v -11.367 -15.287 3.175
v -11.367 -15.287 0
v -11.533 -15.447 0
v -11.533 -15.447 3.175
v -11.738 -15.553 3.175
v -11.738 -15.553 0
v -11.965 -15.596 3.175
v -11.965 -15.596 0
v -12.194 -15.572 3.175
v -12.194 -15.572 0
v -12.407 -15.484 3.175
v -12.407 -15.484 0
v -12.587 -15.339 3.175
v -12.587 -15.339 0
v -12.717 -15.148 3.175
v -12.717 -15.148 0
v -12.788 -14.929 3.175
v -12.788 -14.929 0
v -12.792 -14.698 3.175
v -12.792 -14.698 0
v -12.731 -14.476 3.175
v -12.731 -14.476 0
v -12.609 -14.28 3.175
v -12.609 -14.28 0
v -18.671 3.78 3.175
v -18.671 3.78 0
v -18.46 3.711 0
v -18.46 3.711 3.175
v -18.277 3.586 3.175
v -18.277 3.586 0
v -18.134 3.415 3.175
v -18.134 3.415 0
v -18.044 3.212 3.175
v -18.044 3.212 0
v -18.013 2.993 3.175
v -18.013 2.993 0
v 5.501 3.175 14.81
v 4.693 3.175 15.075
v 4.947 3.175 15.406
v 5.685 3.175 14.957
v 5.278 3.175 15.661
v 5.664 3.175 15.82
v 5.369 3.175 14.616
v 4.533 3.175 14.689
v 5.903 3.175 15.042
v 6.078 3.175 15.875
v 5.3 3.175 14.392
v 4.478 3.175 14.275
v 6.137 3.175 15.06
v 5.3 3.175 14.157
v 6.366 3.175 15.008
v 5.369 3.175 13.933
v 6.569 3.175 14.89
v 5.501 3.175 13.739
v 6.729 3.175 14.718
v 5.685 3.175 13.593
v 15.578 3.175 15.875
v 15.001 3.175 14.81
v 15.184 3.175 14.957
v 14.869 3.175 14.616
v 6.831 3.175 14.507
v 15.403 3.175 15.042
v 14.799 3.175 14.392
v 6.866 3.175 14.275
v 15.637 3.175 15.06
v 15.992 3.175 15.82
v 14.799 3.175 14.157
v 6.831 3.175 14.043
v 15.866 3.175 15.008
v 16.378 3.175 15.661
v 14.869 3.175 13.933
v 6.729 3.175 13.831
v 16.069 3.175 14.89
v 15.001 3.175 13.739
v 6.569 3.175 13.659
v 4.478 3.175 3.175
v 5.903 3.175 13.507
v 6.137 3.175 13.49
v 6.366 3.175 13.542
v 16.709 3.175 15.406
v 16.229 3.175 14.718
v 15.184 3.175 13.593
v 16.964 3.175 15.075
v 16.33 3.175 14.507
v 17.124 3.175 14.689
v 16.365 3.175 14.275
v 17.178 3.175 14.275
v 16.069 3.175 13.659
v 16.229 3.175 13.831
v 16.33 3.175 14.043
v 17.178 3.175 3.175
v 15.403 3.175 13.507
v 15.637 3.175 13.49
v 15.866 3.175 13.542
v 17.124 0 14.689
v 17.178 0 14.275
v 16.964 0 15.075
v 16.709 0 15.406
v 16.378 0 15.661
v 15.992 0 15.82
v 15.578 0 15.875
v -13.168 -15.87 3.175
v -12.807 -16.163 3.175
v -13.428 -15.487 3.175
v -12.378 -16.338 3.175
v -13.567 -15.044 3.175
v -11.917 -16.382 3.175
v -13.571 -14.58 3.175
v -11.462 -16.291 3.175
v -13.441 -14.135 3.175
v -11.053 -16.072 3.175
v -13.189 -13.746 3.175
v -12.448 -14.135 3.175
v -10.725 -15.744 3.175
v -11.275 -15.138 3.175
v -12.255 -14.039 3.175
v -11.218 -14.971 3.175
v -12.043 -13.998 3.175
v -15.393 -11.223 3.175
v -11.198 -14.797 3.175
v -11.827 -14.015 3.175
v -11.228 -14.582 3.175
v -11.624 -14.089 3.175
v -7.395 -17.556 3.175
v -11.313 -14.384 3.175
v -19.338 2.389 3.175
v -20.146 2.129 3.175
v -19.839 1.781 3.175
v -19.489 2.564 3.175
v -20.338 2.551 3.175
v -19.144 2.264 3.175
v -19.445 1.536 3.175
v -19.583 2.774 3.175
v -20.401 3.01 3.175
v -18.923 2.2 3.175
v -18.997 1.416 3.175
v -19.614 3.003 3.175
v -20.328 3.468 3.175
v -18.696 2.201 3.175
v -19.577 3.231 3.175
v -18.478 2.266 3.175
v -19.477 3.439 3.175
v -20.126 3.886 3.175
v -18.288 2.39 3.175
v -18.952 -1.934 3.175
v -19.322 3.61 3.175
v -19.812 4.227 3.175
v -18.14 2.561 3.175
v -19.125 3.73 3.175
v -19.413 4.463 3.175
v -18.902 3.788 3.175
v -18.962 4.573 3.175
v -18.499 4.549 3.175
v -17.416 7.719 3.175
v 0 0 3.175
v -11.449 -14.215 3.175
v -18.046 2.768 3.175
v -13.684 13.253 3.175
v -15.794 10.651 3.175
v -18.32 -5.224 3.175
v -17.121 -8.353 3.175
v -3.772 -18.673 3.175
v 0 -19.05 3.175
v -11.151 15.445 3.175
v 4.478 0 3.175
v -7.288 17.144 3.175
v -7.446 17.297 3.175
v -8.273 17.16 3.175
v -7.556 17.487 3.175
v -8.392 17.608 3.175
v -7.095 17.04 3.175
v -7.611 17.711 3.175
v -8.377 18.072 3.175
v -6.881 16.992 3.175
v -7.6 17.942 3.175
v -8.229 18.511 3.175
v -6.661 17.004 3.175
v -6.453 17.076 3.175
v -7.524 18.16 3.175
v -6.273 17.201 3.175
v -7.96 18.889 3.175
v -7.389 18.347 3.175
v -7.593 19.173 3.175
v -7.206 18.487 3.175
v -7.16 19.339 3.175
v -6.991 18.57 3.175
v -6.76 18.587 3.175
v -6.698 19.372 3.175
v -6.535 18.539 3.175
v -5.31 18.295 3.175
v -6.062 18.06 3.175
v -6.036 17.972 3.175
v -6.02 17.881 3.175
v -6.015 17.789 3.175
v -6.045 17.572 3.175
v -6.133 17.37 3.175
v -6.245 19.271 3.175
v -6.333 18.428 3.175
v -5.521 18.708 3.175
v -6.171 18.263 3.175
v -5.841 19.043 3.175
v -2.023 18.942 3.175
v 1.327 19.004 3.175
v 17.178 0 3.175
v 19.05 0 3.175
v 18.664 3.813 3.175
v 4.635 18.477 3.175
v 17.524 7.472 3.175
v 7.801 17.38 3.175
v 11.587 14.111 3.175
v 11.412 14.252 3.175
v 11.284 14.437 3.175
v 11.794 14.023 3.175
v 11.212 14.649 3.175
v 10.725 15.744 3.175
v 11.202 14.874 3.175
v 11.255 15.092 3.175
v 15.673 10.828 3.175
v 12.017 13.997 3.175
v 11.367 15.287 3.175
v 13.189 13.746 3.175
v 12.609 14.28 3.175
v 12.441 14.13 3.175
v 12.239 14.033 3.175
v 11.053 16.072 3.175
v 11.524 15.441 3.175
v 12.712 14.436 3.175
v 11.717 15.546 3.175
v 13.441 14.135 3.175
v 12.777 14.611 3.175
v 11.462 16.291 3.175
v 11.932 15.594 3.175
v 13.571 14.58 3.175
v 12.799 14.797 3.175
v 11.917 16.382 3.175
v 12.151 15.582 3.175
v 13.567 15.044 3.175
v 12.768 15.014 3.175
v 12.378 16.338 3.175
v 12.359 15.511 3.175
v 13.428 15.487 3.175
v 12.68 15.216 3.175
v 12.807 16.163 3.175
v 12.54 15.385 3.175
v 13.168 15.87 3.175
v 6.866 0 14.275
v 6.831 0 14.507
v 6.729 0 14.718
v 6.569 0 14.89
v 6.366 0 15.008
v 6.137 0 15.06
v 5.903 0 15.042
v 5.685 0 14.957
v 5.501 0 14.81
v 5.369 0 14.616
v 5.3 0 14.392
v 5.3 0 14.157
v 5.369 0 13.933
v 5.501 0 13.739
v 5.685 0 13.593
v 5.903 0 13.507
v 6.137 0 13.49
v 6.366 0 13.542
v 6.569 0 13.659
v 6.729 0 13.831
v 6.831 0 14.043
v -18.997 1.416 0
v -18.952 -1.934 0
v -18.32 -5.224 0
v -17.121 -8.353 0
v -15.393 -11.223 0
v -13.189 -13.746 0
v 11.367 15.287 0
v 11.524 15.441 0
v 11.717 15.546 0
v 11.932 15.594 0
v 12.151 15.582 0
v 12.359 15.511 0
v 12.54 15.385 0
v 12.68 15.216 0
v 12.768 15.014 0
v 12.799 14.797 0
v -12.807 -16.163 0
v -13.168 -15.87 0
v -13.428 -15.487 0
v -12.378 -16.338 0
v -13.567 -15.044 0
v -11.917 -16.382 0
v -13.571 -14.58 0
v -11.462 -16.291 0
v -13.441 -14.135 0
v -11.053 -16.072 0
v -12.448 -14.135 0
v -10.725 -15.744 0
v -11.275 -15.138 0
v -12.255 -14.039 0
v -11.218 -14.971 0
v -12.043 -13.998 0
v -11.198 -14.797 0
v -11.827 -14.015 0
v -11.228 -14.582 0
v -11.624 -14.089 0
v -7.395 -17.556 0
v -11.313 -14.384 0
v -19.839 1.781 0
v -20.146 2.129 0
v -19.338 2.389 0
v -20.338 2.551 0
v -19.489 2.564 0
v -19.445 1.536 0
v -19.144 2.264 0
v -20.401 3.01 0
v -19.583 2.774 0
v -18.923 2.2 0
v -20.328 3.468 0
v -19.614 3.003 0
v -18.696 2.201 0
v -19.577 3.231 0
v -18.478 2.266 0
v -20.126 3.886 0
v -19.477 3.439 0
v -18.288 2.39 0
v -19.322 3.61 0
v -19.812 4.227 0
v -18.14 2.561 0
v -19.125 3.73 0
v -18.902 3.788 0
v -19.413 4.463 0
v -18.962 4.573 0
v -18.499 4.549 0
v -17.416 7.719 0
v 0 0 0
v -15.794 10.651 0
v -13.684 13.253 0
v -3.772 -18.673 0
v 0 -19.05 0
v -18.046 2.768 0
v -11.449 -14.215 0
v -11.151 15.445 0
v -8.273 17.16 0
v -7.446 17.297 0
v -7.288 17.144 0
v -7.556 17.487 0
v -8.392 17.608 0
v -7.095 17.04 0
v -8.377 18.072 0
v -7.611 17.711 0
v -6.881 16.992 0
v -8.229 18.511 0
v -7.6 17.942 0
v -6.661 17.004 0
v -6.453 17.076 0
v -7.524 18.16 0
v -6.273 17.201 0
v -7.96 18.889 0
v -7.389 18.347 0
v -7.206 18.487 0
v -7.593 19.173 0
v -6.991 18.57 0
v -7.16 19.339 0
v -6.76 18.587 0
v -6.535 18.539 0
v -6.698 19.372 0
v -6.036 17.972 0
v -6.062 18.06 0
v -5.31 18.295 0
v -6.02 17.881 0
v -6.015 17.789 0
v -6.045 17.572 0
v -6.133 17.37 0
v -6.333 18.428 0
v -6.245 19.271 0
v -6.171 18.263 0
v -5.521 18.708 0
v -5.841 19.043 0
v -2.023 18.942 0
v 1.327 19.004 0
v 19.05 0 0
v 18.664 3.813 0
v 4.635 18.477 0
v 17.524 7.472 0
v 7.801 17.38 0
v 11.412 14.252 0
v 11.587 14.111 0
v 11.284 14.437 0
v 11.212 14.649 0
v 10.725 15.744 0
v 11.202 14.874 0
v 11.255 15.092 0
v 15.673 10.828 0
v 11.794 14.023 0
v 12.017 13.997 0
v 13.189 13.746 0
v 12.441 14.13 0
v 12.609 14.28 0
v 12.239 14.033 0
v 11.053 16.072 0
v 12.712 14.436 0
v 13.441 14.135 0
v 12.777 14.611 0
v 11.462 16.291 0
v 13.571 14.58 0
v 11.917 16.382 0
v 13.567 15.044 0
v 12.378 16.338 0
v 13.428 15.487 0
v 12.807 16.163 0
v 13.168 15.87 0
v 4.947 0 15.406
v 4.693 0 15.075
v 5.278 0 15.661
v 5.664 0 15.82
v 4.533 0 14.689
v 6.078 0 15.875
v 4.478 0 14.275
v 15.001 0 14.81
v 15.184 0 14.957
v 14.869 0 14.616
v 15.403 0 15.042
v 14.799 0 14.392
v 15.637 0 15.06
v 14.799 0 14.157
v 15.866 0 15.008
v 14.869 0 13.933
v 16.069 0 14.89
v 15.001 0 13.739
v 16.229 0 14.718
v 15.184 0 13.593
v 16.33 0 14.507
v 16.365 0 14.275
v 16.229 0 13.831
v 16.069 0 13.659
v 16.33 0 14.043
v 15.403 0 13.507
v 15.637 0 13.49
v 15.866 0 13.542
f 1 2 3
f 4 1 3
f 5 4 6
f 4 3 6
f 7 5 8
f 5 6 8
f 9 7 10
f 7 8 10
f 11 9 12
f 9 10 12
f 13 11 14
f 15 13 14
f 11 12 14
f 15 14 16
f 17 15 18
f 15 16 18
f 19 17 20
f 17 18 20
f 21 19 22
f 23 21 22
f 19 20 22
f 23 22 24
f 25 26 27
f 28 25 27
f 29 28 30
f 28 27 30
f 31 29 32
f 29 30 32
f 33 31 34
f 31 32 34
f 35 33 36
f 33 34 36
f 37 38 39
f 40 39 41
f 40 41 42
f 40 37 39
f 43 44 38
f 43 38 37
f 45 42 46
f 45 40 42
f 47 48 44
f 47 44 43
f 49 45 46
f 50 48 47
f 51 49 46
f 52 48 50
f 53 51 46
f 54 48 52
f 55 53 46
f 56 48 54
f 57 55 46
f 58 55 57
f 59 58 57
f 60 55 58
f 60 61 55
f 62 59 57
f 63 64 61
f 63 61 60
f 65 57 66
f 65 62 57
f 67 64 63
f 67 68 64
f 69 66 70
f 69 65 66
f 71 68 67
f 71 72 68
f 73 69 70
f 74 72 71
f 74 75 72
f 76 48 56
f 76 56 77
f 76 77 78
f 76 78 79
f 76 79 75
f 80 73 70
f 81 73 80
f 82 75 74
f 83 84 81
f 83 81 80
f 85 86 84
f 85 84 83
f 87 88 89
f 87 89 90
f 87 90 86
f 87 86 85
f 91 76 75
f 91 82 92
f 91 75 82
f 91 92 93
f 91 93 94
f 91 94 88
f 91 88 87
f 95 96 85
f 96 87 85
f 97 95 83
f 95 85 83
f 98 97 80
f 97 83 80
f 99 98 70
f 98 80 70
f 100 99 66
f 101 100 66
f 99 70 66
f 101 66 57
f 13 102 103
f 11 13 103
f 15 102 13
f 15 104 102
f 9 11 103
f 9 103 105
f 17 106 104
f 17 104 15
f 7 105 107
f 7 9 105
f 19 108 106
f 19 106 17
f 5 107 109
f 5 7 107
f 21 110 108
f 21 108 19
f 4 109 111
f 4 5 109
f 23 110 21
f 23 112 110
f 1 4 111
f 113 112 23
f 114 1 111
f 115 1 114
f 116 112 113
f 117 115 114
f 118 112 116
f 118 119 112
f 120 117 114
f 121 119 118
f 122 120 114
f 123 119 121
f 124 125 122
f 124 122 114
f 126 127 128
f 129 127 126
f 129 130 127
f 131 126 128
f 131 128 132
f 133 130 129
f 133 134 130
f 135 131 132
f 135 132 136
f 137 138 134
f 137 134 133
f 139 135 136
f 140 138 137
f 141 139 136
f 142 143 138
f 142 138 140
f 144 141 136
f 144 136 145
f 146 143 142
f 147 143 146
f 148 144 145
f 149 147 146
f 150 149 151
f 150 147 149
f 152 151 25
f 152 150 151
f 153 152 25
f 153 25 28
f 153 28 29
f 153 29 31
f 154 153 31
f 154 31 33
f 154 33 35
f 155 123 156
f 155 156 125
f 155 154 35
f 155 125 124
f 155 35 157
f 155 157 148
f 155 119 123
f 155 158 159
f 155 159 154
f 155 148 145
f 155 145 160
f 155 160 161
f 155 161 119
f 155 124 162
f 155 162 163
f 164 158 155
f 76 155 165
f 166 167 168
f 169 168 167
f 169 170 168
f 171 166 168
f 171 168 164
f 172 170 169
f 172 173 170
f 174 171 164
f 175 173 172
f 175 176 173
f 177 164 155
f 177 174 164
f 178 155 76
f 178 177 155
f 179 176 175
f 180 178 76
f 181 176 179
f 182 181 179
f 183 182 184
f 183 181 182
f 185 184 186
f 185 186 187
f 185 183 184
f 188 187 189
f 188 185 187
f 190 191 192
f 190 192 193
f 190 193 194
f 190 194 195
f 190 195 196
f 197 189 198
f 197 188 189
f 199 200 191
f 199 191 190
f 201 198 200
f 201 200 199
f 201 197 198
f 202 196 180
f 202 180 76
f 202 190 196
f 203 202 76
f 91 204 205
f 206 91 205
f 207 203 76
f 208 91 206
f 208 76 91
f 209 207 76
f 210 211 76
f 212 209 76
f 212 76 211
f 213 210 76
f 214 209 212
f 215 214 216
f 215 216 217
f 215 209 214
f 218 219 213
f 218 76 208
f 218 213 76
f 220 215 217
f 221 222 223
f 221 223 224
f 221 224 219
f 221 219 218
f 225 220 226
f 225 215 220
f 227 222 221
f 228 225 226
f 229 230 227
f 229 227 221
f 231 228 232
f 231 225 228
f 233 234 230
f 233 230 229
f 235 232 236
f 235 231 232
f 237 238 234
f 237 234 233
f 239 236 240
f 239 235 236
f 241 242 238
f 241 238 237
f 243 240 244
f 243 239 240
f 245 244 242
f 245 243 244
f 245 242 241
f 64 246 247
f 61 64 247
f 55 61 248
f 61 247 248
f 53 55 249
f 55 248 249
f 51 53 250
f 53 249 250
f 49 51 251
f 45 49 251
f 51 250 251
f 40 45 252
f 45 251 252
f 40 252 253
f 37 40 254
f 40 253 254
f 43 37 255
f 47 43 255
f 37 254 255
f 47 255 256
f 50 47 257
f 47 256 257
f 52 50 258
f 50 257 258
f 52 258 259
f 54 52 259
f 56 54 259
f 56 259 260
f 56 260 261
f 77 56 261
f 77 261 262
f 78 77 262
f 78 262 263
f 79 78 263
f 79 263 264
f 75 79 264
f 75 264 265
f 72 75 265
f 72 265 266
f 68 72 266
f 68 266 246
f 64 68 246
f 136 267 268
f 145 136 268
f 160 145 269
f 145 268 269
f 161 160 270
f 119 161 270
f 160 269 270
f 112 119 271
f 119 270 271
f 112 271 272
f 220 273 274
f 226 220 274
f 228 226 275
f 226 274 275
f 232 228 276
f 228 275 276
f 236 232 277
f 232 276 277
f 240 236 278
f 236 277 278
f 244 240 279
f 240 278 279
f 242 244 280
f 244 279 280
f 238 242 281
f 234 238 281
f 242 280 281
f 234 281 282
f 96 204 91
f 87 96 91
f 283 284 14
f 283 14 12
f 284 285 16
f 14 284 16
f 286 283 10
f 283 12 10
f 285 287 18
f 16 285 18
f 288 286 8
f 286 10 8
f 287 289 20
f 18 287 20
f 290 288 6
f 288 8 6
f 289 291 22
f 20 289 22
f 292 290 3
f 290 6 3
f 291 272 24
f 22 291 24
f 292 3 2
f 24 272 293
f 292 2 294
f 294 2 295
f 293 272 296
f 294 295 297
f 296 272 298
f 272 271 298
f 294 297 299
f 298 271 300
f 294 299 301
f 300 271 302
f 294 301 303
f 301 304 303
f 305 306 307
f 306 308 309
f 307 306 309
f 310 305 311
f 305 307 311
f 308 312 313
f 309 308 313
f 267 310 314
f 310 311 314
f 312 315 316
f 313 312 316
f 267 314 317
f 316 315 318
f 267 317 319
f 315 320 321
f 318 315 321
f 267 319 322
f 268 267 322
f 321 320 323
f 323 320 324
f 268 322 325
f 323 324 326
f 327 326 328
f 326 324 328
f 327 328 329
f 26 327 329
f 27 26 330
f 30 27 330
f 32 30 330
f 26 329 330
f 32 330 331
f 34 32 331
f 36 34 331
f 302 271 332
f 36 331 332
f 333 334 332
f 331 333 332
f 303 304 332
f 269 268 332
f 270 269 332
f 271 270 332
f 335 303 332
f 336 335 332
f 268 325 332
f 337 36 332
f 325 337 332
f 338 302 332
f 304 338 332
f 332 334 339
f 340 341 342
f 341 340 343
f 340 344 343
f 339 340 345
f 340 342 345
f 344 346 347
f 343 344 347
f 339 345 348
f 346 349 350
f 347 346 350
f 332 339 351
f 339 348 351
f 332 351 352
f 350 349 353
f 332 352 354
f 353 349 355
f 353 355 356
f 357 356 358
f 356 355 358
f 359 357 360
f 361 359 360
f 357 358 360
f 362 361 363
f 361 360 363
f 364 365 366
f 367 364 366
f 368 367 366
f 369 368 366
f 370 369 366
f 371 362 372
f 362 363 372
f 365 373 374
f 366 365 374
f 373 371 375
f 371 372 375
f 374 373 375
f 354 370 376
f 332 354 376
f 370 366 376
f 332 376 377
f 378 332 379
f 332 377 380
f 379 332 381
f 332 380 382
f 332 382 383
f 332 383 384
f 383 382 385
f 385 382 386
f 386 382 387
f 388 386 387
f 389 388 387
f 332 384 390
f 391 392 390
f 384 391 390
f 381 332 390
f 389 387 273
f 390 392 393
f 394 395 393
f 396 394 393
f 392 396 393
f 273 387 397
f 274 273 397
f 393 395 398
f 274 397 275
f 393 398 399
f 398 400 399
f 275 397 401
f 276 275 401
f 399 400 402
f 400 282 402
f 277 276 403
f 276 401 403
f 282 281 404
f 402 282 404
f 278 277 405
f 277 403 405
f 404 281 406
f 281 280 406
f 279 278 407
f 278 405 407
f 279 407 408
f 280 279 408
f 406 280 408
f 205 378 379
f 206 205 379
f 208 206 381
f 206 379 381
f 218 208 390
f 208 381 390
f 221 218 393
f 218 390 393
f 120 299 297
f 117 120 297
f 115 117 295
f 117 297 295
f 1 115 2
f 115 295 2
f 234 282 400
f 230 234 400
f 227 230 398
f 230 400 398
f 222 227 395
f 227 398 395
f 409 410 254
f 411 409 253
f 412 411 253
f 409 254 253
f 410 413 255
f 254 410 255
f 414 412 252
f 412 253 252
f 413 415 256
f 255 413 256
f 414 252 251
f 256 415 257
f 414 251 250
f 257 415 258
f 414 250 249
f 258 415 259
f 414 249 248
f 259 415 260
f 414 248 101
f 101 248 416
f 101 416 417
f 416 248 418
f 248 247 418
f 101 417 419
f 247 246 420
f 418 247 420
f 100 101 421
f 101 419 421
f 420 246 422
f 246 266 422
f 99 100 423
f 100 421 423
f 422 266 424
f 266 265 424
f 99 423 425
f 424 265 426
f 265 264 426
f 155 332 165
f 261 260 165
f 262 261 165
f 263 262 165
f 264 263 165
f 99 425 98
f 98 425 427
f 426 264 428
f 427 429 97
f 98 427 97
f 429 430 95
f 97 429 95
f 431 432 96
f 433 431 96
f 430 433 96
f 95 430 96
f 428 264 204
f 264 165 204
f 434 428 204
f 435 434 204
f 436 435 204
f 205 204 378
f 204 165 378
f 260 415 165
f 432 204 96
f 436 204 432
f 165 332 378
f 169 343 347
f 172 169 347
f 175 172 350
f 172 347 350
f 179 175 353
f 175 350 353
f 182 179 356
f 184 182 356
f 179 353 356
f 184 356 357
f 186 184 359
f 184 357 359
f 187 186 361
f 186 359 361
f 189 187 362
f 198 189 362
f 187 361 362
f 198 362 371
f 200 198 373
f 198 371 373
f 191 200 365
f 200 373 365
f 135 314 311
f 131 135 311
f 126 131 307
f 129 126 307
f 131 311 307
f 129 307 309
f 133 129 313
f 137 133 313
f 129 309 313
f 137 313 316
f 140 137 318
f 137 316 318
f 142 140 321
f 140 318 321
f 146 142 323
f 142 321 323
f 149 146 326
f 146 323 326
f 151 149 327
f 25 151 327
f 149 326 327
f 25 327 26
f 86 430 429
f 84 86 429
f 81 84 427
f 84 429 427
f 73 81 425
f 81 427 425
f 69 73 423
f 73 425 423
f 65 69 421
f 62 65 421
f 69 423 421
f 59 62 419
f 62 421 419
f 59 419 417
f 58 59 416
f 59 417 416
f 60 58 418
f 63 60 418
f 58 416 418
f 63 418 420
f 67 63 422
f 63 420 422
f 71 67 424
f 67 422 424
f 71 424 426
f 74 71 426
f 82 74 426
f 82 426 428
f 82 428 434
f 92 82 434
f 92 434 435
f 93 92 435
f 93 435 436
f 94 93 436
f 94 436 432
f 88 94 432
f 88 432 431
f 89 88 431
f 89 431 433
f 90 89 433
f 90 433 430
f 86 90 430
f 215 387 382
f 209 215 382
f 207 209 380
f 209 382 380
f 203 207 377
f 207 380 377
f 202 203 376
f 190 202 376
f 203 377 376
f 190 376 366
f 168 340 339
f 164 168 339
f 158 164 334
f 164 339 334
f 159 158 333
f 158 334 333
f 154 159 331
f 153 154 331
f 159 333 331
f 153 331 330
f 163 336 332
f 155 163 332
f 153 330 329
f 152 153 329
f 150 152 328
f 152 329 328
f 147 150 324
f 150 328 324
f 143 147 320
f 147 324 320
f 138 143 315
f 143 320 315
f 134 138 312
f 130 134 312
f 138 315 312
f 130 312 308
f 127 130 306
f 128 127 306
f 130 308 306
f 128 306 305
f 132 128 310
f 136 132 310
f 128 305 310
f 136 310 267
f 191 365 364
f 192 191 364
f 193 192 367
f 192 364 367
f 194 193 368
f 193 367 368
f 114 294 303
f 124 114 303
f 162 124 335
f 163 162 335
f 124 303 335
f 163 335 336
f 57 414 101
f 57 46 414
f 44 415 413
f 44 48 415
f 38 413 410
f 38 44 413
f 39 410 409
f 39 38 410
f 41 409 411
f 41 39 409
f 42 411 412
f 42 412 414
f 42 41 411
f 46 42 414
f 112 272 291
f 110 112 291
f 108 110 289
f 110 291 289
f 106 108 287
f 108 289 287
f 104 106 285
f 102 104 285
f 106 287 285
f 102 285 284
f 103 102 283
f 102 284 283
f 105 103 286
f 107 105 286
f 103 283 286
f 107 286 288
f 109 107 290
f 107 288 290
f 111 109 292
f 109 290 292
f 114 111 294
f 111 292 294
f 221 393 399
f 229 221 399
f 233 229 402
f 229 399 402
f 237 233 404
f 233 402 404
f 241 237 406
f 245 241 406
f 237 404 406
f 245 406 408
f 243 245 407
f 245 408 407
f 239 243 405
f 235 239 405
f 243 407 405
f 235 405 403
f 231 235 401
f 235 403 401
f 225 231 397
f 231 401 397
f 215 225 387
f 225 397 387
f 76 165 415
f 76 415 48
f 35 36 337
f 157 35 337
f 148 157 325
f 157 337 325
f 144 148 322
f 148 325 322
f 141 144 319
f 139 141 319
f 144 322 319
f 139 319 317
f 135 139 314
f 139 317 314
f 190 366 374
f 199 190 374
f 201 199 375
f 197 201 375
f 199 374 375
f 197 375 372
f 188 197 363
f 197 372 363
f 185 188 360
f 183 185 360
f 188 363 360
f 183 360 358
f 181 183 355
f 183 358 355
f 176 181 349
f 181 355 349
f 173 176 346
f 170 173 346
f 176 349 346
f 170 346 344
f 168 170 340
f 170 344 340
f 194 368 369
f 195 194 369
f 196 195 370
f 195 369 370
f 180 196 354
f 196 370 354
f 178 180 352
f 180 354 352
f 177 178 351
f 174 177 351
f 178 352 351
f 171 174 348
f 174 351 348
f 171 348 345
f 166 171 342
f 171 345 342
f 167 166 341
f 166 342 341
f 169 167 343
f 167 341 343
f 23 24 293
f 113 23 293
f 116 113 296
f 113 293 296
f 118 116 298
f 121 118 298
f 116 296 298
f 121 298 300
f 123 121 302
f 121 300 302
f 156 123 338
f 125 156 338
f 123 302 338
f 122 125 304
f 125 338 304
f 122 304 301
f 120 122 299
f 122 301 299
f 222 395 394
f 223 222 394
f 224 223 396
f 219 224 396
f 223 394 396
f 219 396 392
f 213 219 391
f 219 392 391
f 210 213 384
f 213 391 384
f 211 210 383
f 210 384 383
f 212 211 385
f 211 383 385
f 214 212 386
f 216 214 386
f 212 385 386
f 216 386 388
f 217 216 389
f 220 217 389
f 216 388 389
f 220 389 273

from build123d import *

# Parameters (mm, degrees)
F1_DEPTH = 3.175
F2_W     = 12.7
F2_H     = 3.175
F3_DEPTH = 12.7
F4_R     = 1.6002
F5_R     = 0.7874
F6_DEPTH = 19.377747


with BuildPart() as f1:
    # F0 (on Top) → F1 (new body)
    with BuildSketch(Plane.XY):
        with BuildLine():
            Line((0, 0), (19.05, 0))
            ThreePointArc((19.05, 0), (17.523524, 7.471855), (13.188727, 13.746271))
            ThreePointArc((13.188727, 13.746271), (12.901694, 14.016019), (12.609145, 14.279775))
            ThreePointArc((12.609145, 14.279775), (11.494472, 14.175188), (11.366501, 15.287418))
            ThreePointArc((11.366501, 15.287418), (11.047993, 15.519161), (10.724761, 15.744269))
            ThreePointArc((10.724761, 15.744269), (2.9926, 18.813475), (-5.310256, 18.294908))
            ThreePointArc((-5.310256, 18.294908), (-5.687382, 18.181204), (-6.062075, 18.059727))
            ThreePointArc((-6.062075, 18.059727), (-6.026834, 17.926523), (-6.01497, 17.789247))
            ThreePointArc((-6.01497, 17.789247), (-6.661272, 17.004068), (-7.556042, 17.487388))
            ThreePointArc((-7.556042, 17.487388), (-7.915991, 17.327423), (-8.272556, 17.16005))
            ThreePointArc((-8.272556, 17.16005), (-14.796647, 11.998405), (-18.498984, 4.548637))
            ThreePointArc((-18.498984, 4.548637), (-18.589076, 4.165185), (-18.67122, 3.779952))
            ThreePointArc((-18.67122, 3.779952), (-18.199481, 3.505602), (-18.013375, 2.9926))
            ThreePointArc((-18.013375, 2.9926), (-18.287692, 2.389514), (-18.922543, 2.199969))
            ThreePointArc((-18.922543, 2.199969), (-18.963984, 1.808262), (-18.997317, 1.415781))
            ThreePointArc((-18.997317, 1.415781), (-17.789247, -6.81507), (-13.188727, -13.746271))
            ThreePointArc((-13.188727, -13.746271), (-12.901694, -14.016019), (-12.609145, -14.279775))
            ThreePointArc((-12.609145, -14.279775), (-11.723172, -14.045377), (-11.198305, -14.796647))
            ThreePointArc((-11.198305, -14.796647), (-11.241521, -15.056044), (-11.366501, -15.287418))
            ThreePointArc((-11.366501, -15.287418), (-11.047993, -15.519161), (-10.724761, -15.744269))
            ThreePointArc((-10.724761, -15.744269), (-5.611336, -18.204818), (0, -19.05))
            Line((0, -19.05), (0, 0))
        make_face()
        with BuildLine():
            ThreePointArc((12.609145, 14.279775), (12.901694, 14.016019), (13.188727, 13.746271))
            ThreePointArc((13.188727, 13.746271), (12.998272, 16.029701), (10.724761, 15.744269))
            ThreePointArc((10.724761, 15.744269), (11.047993, 15.519161), (11.366501, 15.287418))
            ThreePointArc((11.366501, 15.287418), (12.257802, 15.553531), (12.798505, 14.796647))
            ThreePointArc((12.798505, 14.796647), (12.749675, 14.521413), (12.609145, 14.279775))
        make_face()
        with BuildLine():
            ThreePointArc((-6.062075, 18.059727), (-5.687382, 18.181204), (-5.310256, 18.294908))
            ThreePointArc((-5.310256, 18.294908), (-7.382992, 19.271685), (-8.272556, 17.16005))
            ThreePointArc((-8.272556, 17.16005), (-7.915991, 17.327423), (-7.556042, 17.487388))
            ThreePointArc((-7.556042, 17.487388), (-7.101303, 18.536396), (-6.062075, 18.059727))
        make_face()
        with BuildLine():
            ThreePointArc((-13.188727, -13.746271), (-12.998272, -16.029701), (-10.724761, -15.744269))
            ThreePointArc((-10.724761, -15.744269), (-11.047993, -15.519161), (-11.366501, -15.287418))
            ThreePointArc((-11.366501, -15.287418), (-12.502338, -15.418106), (-12.609145, -14.279775))
            ThreePointArc((-12.609145, -14.279775), (-12.901694, -14.016019), (-13.188727, -13.746271))
        make_face()
        with BuildLine():
            ThreePointArc((-18.67122, 3.779952), (-18.589076, 4.165185), (-18.498984, 4.548637))
            ThreePointArc((-18.498984, 4.548637), (-20.381265, 3.241984), (-18.997317, 1.415781))
            ThreePointArc((-18.997317, 1.415781), (-18.963984, 1.808262), (-18.922543, 2.199969))
            ThreePointArc((-18.922543, 2.199969), (-19.603641, 3.118289), (-18.67122, 3.779952))
        make_face()
    extrude(amount=F1_DEPTH)

    # F2 (on face) → F3 (join)
    with BuildSketch(Plane.XY.offset(3.175)):
        with Locations((10.828172, 1.5875)):
            Rectangle(F2_W, F2_H)
    extrude(amount=F3_DEPTH)

    # F4
    f4_edges = [f1.edges().sort_by_distance(p)[0] for p in [
        (17.178172, 1.5875, 15.875),
        (4.478172, 1.5875, 15.875),
    ]]
    fillet(f4_edges, radius=F4_R)

    # F5 (on face) → F6 (cut, through all)
    with BuildSketch(Plane.XZ):
        with Locations((15.577972, 14.2748)):
            Circle(F5_R)
        with Locations((6.078372, 14.2748)):
            Circle(F5_R)
    extrude(amount=-F6_DEPTH, mode=Mode.SUBTRACT)


solid = f1.part
